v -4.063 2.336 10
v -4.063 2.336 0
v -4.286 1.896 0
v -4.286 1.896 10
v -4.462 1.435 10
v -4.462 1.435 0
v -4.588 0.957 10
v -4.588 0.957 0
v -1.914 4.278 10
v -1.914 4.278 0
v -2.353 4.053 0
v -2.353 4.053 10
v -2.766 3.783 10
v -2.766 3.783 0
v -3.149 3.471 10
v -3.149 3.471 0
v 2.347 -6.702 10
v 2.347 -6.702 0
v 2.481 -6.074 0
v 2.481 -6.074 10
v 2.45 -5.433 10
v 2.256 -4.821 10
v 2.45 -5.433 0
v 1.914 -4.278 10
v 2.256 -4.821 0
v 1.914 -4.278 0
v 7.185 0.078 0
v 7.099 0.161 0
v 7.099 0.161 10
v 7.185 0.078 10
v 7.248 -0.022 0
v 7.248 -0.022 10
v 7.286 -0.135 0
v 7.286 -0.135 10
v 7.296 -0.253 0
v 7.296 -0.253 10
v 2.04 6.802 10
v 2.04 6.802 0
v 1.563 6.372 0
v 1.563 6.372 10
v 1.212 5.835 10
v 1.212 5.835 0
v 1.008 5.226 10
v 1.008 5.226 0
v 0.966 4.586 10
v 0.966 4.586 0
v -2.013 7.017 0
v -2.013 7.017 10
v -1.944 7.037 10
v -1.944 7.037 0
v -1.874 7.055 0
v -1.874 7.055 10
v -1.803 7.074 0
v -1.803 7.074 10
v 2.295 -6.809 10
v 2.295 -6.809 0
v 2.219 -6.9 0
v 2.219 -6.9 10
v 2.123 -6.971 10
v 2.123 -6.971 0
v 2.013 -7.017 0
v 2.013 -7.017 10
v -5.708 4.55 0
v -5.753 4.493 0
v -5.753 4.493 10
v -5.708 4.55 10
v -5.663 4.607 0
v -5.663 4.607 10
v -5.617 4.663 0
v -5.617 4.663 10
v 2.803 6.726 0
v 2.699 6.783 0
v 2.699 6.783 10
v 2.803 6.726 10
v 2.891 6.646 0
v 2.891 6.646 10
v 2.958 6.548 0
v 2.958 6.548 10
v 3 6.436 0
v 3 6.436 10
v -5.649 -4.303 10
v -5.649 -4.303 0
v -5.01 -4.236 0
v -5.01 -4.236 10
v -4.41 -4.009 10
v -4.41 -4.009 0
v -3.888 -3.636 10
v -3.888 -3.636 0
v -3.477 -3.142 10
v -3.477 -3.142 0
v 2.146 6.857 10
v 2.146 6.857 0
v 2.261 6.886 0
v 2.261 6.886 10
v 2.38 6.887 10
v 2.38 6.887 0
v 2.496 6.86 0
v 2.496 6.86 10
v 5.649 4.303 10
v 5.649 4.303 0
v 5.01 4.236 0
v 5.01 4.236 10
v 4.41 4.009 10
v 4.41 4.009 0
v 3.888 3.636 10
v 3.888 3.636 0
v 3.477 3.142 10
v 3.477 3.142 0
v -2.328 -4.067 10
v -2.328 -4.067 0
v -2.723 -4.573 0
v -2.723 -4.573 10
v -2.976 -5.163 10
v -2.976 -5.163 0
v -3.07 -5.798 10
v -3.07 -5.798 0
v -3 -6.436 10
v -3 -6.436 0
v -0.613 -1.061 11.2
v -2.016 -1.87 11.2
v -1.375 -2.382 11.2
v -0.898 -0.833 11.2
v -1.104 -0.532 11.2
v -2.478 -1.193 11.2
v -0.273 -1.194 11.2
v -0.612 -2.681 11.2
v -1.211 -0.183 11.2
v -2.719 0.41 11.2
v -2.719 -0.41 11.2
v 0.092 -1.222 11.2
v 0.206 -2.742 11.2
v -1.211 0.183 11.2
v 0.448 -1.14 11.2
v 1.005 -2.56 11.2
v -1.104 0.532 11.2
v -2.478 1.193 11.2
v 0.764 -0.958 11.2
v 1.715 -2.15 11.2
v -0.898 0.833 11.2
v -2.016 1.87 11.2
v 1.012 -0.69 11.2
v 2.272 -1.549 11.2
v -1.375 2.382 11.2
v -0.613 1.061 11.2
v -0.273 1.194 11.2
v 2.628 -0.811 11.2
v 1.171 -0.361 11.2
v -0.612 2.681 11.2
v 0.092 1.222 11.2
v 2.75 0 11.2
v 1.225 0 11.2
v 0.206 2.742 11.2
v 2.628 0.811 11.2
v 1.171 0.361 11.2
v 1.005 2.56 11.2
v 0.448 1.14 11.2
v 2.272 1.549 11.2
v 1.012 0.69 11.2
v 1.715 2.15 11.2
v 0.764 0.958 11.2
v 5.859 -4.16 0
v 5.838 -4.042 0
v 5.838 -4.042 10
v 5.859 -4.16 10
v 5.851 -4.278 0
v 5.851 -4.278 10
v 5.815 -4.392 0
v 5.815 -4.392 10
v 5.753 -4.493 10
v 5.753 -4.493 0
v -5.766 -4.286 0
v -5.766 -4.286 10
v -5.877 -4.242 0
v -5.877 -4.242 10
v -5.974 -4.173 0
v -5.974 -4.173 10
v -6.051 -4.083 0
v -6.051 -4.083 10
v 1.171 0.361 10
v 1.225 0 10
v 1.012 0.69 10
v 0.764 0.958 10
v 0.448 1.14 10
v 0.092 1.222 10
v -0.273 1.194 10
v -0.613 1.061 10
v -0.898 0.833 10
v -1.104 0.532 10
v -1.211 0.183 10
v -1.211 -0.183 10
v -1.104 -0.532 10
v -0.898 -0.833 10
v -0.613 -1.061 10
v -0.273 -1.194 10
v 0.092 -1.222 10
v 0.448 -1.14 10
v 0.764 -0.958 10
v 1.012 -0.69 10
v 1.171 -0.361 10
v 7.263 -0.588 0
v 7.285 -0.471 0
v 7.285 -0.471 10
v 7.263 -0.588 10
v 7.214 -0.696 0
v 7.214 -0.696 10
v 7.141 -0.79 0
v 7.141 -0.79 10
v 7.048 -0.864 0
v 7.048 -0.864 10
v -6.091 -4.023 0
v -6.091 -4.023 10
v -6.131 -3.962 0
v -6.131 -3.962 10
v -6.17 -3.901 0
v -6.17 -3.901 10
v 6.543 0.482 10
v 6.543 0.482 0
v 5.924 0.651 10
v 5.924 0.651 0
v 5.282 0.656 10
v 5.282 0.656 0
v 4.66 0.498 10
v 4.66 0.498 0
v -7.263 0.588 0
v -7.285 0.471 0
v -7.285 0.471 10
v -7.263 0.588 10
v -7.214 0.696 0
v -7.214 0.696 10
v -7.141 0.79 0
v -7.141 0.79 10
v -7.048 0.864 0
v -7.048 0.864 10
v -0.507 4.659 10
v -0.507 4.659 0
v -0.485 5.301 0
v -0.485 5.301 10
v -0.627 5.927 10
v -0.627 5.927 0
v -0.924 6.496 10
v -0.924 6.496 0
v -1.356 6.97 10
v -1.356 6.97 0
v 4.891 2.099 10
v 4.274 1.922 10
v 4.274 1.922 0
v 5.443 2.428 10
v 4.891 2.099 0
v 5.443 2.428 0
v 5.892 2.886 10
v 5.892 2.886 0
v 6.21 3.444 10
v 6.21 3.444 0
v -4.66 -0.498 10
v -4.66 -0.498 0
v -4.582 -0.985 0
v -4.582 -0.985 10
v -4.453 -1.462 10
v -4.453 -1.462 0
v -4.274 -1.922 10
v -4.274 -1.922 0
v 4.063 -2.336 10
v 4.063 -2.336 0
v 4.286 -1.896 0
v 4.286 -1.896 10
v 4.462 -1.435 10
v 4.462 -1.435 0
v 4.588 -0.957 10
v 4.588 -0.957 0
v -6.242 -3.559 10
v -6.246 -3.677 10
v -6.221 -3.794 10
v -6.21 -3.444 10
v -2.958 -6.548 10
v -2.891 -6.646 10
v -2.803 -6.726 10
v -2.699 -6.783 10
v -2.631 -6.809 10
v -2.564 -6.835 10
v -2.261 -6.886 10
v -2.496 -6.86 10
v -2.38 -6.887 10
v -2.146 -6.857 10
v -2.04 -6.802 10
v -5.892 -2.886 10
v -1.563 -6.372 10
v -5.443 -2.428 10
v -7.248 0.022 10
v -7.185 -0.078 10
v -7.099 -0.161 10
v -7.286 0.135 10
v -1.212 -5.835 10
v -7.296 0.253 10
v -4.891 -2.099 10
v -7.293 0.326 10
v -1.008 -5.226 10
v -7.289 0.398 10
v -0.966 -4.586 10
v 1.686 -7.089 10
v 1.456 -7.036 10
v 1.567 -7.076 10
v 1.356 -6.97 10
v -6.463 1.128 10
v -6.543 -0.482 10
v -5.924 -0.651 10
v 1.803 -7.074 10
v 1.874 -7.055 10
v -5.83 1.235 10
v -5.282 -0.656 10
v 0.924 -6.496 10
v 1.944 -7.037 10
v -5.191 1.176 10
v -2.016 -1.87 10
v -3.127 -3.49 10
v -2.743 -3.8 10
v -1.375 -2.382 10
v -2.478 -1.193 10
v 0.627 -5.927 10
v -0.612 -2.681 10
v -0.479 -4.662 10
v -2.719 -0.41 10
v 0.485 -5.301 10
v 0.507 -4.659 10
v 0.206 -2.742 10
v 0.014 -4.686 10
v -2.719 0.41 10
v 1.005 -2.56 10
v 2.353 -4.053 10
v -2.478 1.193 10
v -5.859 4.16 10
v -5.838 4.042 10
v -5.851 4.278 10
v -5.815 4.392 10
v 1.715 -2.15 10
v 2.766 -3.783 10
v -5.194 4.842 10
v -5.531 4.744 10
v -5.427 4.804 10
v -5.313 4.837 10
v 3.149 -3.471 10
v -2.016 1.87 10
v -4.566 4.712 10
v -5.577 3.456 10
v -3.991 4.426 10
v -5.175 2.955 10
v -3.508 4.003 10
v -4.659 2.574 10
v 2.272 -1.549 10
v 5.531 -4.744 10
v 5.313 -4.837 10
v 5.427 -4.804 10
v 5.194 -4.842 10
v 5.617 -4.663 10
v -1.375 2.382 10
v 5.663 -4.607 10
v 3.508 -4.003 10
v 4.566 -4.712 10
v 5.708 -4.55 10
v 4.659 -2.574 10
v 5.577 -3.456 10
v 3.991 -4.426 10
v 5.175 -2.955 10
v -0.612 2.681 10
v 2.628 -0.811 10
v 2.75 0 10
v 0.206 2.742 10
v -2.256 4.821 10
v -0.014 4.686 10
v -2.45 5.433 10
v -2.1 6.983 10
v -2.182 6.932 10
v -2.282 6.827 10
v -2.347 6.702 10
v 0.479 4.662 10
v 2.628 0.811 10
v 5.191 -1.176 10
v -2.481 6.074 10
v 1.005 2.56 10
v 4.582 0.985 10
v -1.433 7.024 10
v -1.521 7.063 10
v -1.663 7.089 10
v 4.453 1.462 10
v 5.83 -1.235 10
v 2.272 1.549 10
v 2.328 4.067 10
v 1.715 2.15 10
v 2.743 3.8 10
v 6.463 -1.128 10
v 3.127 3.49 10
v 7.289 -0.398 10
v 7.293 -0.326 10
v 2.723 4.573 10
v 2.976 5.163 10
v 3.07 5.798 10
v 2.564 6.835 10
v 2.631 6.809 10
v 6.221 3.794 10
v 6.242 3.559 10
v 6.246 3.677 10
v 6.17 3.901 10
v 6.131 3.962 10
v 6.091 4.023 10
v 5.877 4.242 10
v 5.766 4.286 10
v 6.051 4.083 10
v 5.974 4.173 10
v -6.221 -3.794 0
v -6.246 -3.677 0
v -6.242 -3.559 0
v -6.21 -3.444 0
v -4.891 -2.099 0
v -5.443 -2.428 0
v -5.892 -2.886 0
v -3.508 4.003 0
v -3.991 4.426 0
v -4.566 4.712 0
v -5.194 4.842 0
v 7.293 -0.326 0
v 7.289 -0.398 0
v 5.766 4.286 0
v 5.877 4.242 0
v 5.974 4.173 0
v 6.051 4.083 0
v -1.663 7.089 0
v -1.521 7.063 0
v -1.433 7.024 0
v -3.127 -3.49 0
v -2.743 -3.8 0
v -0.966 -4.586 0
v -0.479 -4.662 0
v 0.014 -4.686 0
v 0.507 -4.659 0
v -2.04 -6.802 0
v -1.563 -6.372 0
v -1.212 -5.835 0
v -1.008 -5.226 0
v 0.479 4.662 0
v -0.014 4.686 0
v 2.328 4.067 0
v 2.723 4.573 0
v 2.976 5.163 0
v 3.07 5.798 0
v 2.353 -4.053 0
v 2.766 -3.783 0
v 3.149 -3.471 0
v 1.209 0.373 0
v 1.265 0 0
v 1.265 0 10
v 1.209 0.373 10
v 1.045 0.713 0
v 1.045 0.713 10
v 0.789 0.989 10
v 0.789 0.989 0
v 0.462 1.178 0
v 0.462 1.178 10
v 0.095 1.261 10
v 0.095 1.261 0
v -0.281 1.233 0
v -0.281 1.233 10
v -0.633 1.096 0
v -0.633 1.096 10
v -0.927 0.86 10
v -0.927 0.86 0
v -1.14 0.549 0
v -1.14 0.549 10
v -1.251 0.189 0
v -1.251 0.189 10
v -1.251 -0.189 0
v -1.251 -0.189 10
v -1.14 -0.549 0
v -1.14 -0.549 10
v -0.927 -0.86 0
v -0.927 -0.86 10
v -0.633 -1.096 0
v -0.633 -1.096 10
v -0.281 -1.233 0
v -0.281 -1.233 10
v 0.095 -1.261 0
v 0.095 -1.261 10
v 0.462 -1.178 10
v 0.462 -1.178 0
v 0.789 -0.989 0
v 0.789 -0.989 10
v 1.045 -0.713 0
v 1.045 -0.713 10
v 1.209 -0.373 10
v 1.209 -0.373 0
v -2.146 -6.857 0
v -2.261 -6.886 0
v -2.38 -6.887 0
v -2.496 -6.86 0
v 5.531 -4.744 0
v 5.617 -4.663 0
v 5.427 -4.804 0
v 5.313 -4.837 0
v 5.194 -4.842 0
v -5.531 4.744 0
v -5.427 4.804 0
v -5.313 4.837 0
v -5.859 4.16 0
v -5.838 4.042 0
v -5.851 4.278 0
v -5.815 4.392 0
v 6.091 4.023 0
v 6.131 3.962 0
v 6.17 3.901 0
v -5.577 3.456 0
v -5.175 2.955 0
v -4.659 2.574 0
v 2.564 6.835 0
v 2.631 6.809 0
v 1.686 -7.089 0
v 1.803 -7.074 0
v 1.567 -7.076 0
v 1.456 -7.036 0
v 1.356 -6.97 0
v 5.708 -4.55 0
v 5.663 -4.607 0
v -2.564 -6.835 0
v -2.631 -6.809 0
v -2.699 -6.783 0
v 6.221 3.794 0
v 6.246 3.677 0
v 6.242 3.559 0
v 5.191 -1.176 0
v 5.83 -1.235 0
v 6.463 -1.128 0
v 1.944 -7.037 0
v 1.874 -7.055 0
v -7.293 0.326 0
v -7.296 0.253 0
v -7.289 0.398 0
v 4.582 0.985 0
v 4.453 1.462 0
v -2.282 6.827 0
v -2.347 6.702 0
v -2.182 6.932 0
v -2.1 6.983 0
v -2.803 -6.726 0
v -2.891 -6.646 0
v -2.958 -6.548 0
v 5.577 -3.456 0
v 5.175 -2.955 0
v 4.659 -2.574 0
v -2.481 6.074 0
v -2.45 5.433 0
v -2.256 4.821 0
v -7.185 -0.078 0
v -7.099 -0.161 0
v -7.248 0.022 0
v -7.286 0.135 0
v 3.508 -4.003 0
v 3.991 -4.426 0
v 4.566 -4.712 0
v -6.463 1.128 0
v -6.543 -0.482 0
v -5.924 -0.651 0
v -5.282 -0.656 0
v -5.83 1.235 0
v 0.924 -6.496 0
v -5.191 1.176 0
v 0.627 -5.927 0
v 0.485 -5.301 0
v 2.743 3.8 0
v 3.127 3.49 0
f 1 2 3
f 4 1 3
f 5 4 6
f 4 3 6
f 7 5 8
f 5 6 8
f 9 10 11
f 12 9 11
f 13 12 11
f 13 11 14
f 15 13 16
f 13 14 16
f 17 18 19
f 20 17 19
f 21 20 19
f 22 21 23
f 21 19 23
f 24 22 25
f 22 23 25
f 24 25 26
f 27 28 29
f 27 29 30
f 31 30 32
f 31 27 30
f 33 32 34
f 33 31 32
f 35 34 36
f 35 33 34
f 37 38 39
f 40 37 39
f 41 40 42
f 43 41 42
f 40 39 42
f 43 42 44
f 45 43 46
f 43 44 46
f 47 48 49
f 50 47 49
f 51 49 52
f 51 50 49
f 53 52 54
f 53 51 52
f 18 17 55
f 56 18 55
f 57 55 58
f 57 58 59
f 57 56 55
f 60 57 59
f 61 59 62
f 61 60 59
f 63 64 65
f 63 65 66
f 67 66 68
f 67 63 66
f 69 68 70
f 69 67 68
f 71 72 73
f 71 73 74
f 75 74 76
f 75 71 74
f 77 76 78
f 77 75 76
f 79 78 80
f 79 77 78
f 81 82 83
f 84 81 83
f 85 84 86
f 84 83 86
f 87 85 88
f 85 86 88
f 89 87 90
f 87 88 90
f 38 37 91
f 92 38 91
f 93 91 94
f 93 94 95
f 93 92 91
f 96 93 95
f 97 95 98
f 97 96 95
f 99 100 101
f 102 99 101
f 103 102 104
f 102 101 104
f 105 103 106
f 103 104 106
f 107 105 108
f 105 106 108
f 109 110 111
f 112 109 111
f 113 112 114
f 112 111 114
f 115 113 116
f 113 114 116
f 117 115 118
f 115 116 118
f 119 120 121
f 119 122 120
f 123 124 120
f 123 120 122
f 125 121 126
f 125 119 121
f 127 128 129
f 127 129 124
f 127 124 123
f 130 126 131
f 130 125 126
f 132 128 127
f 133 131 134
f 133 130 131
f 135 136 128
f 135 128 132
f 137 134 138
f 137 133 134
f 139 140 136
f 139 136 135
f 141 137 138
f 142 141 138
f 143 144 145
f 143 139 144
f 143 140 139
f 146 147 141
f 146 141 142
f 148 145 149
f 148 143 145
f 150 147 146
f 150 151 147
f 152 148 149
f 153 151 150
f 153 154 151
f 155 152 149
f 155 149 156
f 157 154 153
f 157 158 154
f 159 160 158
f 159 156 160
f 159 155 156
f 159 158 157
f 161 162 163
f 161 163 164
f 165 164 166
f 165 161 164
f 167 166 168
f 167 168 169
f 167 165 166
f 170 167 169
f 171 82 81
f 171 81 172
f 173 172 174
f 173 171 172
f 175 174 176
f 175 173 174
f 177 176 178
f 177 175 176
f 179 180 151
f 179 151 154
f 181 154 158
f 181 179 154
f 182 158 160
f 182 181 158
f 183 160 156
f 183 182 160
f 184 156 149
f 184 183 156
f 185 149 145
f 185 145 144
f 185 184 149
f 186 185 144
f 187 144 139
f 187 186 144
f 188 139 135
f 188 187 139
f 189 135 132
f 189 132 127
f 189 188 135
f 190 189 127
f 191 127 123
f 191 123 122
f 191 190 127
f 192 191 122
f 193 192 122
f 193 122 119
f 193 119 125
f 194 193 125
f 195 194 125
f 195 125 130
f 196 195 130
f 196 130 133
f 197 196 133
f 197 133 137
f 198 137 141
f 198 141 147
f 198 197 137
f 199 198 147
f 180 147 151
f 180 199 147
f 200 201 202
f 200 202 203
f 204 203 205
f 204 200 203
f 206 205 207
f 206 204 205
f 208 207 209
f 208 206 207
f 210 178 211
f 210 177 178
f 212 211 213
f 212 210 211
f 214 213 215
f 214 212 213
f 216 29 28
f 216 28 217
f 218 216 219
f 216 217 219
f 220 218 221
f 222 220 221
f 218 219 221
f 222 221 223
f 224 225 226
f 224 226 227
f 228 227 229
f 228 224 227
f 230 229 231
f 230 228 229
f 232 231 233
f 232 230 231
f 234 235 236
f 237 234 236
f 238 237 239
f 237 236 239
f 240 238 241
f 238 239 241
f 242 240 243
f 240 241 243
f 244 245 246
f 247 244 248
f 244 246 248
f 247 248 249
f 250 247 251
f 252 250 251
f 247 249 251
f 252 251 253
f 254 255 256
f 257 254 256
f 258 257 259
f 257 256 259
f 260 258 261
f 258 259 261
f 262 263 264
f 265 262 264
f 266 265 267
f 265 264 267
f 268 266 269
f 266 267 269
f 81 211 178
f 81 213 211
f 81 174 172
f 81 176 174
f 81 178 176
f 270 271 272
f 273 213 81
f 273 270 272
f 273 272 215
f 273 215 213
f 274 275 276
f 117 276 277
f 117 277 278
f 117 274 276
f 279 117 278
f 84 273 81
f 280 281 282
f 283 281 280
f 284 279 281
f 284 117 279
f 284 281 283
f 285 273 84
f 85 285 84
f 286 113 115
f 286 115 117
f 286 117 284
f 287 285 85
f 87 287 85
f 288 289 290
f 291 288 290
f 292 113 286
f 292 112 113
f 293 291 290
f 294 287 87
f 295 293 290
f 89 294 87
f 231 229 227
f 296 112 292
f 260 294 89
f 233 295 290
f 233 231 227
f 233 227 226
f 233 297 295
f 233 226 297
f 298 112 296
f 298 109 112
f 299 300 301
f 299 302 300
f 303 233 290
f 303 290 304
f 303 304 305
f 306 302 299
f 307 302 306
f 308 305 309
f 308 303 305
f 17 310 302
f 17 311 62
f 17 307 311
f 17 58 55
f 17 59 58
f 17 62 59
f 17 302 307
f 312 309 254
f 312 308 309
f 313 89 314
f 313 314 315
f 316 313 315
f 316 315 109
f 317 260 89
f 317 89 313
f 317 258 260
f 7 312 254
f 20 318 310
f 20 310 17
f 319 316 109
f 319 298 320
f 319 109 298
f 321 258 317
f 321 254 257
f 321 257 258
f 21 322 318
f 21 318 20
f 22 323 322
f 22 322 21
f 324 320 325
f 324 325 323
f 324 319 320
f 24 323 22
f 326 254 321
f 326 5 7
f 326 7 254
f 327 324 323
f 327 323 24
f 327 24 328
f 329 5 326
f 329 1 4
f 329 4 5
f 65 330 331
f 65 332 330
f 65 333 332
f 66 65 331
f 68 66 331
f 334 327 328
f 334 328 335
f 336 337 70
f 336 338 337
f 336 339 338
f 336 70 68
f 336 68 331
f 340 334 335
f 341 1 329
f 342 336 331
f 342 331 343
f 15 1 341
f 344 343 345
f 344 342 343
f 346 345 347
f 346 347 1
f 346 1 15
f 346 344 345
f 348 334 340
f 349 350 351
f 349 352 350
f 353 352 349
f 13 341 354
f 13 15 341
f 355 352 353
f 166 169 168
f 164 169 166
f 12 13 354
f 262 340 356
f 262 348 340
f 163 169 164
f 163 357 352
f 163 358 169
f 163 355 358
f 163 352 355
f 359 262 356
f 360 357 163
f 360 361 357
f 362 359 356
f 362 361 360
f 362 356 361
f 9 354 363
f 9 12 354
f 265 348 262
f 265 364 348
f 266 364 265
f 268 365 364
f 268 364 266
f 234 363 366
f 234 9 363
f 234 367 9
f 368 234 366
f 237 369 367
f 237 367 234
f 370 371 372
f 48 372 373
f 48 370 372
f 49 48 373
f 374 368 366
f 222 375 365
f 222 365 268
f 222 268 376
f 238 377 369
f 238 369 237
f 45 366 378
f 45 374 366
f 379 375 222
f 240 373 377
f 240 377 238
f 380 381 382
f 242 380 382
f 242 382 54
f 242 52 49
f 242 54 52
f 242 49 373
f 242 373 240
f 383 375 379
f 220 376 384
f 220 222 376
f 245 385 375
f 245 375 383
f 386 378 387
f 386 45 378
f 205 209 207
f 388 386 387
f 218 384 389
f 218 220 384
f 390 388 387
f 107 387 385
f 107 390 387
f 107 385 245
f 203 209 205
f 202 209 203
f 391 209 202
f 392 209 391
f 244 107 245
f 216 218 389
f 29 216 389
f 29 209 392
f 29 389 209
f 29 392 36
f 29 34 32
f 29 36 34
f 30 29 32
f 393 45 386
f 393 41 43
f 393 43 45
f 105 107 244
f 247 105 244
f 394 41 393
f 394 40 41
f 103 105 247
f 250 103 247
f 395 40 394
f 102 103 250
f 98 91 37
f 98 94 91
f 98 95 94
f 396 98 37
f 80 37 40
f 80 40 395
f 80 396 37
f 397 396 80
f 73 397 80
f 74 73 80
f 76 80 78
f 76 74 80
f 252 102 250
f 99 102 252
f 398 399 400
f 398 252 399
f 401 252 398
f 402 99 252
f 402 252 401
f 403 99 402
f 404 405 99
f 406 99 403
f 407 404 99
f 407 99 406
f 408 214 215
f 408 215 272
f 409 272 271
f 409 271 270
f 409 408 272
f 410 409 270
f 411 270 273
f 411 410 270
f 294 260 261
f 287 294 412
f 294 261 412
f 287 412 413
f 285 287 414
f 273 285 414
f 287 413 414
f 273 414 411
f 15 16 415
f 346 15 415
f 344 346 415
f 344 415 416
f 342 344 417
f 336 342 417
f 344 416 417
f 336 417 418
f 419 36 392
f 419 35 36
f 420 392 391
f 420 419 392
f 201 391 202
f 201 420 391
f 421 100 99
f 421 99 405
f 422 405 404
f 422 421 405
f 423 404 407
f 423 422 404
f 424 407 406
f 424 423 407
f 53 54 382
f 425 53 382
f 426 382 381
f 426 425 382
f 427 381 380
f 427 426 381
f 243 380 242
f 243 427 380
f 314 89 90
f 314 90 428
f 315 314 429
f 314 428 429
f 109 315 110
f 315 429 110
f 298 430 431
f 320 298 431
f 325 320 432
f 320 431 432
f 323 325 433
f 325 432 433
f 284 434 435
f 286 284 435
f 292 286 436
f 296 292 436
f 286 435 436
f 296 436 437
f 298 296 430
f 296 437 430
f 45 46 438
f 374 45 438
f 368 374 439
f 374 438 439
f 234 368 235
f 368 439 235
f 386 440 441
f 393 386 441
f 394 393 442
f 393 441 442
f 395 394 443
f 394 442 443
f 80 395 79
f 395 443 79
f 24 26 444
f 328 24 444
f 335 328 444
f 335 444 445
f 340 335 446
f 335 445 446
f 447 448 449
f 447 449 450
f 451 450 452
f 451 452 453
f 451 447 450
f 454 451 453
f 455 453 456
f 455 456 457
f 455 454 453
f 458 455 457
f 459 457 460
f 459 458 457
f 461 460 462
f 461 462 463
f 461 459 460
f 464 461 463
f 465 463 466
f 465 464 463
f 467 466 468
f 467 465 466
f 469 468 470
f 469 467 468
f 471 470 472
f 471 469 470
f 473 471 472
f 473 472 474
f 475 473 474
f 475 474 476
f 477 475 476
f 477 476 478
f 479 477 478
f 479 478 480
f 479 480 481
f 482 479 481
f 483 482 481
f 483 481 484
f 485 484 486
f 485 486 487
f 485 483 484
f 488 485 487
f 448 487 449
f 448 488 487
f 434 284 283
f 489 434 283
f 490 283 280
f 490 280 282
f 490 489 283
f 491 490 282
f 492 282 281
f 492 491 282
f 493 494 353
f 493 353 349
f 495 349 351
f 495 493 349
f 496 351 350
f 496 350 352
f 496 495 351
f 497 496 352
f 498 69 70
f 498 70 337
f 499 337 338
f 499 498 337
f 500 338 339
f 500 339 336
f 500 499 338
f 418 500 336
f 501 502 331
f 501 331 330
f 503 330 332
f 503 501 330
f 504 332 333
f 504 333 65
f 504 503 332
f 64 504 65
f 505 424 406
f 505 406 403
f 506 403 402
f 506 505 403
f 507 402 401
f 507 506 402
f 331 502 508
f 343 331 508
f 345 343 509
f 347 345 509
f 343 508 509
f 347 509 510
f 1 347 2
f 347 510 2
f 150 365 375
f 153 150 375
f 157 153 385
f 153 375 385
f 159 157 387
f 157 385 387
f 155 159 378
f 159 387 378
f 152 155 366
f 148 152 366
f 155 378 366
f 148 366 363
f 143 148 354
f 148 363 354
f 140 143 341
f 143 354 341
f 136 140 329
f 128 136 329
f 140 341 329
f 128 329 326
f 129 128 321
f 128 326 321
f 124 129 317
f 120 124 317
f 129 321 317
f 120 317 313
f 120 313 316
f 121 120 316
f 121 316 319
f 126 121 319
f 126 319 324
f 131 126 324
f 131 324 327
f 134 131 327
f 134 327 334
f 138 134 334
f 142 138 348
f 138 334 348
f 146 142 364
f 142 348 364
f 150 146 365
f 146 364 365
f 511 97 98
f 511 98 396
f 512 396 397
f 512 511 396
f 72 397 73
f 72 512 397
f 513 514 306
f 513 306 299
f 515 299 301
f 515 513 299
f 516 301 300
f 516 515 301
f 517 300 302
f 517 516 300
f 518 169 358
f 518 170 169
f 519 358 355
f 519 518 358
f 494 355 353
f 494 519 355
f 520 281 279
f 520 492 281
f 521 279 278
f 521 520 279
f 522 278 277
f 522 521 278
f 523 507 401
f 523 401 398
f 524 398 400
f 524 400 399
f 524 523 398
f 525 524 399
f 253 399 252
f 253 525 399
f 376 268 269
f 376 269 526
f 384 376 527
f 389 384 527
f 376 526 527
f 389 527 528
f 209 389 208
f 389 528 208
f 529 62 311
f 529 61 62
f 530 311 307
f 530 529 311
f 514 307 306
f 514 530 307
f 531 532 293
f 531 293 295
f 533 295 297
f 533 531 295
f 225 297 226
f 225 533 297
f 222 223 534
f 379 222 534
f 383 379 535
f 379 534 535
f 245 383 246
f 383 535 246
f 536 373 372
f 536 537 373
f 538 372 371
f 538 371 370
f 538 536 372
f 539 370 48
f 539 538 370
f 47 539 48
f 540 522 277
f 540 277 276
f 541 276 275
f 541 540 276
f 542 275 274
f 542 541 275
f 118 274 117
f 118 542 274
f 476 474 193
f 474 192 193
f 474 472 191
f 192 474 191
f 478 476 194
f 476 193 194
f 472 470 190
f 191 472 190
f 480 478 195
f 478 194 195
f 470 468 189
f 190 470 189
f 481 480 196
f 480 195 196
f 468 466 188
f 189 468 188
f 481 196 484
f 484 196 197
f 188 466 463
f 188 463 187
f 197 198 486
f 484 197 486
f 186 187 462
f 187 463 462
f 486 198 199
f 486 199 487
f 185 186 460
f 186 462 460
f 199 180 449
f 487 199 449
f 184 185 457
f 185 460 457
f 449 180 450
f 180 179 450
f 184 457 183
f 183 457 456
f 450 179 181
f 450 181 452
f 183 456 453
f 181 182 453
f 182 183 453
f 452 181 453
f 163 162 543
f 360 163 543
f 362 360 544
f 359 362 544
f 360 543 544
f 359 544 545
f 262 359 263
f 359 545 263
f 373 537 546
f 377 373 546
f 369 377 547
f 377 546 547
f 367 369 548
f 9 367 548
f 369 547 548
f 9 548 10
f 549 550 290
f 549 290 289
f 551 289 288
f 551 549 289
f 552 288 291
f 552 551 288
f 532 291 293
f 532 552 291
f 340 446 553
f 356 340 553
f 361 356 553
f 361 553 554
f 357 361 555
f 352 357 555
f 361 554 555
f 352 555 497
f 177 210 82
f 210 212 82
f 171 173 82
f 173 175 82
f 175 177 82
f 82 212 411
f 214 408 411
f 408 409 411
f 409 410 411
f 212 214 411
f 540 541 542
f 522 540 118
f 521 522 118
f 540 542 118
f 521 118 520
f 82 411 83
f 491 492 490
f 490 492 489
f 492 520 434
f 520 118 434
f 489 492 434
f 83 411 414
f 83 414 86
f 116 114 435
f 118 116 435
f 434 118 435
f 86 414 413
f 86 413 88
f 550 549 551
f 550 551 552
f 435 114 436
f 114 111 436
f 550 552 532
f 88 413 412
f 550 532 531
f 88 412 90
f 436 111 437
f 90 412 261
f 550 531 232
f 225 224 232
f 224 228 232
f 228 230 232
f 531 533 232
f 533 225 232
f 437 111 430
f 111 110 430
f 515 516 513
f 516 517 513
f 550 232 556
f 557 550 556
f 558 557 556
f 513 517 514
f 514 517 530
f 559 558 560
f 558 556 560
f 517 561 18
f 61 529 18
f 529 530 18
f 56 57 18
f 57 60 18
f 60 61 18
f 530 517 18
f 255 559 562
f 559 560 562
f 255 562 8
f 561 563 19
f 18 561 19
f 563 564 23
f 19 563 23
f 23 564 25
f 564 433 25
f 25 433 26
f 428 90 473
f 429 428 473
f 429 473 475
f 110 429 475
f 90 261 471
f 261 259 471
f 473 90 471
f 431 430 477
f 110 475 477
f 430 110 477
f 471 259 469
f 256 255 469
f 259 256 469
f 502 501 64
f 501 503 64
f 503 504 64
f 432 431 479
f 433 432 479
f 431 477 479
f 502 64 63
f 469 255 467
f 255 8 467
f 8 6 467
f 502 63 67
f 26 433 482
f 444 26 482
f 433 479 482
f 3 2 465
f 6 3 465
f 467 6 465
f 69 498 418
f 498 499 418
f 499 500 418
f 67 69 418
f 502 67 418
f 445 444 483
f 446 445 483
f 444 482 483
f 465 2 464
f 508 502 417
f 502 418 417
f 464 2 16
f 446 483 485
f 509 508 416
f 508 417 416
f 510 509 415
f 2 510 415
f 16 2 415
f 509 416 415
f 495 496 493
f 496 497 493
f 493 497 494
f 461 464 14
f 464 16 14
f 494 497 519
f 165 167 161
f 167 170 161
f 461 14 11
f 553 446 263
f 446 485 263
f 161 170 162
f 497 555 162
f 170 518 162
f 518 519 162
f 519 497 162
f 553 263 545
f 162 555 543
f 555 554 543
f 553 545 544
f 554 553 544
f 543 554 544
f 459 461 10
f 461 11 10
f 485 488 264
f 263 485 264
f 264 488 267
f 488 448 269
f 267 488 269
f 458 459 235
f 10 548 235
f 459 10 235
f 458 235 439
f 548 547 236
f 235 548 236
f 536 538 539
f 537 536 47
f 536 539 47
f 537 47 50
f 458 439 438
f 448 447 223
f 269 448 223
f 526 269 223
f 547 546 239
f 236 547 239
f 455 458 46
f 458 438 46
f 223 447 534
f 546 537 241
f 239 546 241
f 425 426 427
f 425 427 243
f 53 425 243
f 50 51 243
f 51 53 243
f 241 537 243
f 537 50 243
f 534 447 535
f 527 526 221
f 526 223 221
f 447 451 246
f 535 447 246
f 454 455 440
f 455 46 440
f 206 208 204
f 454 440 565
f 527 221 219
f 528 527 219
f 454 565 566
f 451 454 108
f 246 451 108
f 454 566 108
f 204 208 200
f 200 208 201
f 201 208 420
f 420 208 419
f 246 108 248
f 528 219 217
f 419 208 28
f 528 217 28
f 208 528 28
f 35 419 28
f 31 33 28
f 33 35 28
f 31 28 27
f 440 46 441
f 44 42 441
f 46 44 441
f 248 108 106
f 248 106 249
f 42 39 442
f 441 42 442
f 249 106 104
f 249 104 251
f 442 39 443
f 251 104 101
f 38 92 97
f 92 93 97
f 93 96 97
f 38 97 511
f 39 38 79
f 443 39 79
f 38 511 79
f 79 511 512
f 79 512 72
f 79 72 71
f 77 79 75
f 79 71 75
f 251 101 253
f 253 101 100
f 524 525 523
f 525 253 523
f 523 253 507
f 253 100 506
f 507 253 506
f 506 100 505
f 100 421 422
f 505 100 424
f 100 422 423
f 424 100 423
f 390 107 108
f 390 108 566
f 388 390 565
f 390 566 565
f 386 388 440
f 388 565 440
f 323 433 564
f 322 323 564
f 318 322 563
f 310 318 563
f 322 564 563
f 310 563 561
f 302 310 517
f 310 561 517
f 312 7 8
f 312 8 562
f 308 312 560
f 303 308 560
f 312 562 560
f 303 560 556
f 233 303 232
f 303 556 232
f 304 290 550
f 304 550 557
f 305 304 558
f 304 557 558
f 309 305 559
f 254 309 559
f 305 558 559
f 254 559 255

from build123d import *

# Parameters (mm, degrees)
SKETCH_1_R               = 1.265
EXTRUDE_1_DEPTH          = 10
SKETCH_2_R               = 2.75
SKETCH_2_R_2             = 1.225
EXTRUDE_2_DEPTH          = 1.2
SKETCH_3_R               = 10.210079725
SKETCH_3_R_2             = 7.3
CUT_EXTRUDE_2_DEPTH      = 16.316956182
FILLET_1_R               = 0.5
PATTERN_CIRCULAR_2_DEPTH = 10


# Read off the part's stored shape, not the designer's step: Круговой массив2
with BuildPart() as part:
    # Эскиз1 → Бобышка-Вытянуть1 (new body)
    with BuildSketch(Plane.XY):
        with BuildLine():
            ThreePointArc((-3.148803906, 3.471068454), (-4.227852242, 4.566214035), (-5.743712894, 4.822837566))
            ThreePointArc((-5.743712894, 4.822837566), (-5.841480421, 4.703945843), (-5.936787387, 4.583072716))
            ThreePointArc((-5.936787387, 4.583072716), (-5.362797198, 3.156810321), (-4.062728379, 2.336133637))
            ThreePointArc((-4.062728379, 2.336133637), (-4.379801209, 1.667520202), (-4.587678719, 0.95733287))
            ThreePointArc((-4.587678719, 0.95733287), (-6.104357582, 1.209075557), (-7.481554138, 0.525687819))
            ThreePointArc((-7.481554138, 0.525687819), (-7.490766927, 0.372036085), (-7.496824441, 0.218227641))
            ThreePointArc((-7.496824441, 0.218227641), (-6.194120622, -0.598259906), (-4.659961201, -0.498040012))
            ThreePointArc((-4.659961201, -0.498040012), (-4.523477392, -1.225330377), (-4.274216191, -1.922071332))
            ThreePointArc((-4.274216191, -1.922071332), (-5.649205805, -2.609888688), (-6.361695989, -3.972256807))
            ThreePointArc((-6.361695989, -3.972256807), (-6.278835069, -4.101978813), (-6.193329365, -4.229972975))
            ThreePointArc((-6.193329365, -4.229972975), (-4.659500498, -4.124815183), (-3.477247231, -3.141979304))
            ThreePointArc((-3.477247231, -3.141979304), (-2.939338959, -3.650146399), (-2.328148353, -4.067309614))
            ThreePointArc((-2.328148353, -4.067309614), (-3.03624942, -5.431964161), (-2.811886199, -6.952934345))
            ThreePointArc((-2.811886199, -6.952934345), (-2.668601624, -7.009177225), (-2.524192976, -7.062467686))
            ThreePointArc((-2.524192976, -7.062467686), (-1.345109555, -6.075831258), (-0.966343005, -4.585789294))
            ThreePointArc((-0.966343005, -4.585789294), (-0.232472948, -4.68073056), (0.507193024, -4.658973866))
            ThreePointArc((0.507193024, -4.658973866), (0.736451045, -6.179213951), (1.811968547, -7.277827285))
            ThreePointArc((1.811968547, -7.277827285), (1.960946938, -7.239108171), (2.109099336, -7.197339786))
            ThreePointArc((2.109099336, -7.197339786), (2.483067519, -5.706086302), (1.913671403, -4.277983638))
            ThreePointArc((1.913671403, -4.277983638), (2.563189827, -3.92343474), (3.148803906, -3.471068454))
            ThreePointArc((3.148803906, -3.471068454), (4.227852242, -4.566214035), (5.743712894, -4.822837566))
            ThreePointArc((5.743712894, -4.822837566), (5.841480421, -4.703945843), (5.936787387, -4.583072716))
            ThreePointArc((5.936787387, -4.583072716), (5.362797198, -3.156810321), (4.062728379, -2.336133637))
            ThreePointArc((4.062728379, -2.336133637), (4.379801209, -1.667520202), (4.587678719, -0.95733287))
            ThreePointArc((4.587678719, -0.95733287), (6.104357582, -1.209075557), (7.481554138, -0.525687819))
            ThreePointArc((7.481554138, -0.525687819), (7.490766927, -0.372036085), (7.496824441, -0.218227641))
            ThreePointArc((7.496824441, -0.218227641), (6.194120622, 0.598259906), (4.659961201, 0.498040012))
            ThreePointArc((4.659961201, 0.498040012), (4.523477392, 1.225330377), (4.274216191, 1.922071332))
            ThreePointArc((4.274216191, 1.922071332), (5.649205805, 2.609888688), (6.361695989, 3.972256807))
            ThreePointArc((6.361695989, 3.972256807), (6.278835069, 4.101978813), (6.193329365, 4.229972975))
            ThreePointArc((6.193329365, 4.229972975), (4.659500498, 4.124815183), (3.477247231, 3.141979304))
            ThreePointArc((3.477247231, 3.141979304), (2.939338959, 3.650146399), (2.328148353, 4.067309614))
            ThreePointArc((2.328148353, 4.067309614), (3.03624942, 5.431964161), (2.811886199, 6.952934345))
            ThreePointArc((2.811886199, 6.952934345), (2.668601624, 7.009177225), (2.524192976, 7.062467686))
            ThreePointArc((2.524192976, 7.062467686), (1.345109555, 6.075831258), (0.966343005, 4.585789294))
            ThreePointArc((0.966343005, 4.585789294), (0.232472948, 4.68073056), (-0.507193024, 4.658973866))
            ThreePointArc((-0.507193024, 4.658973866), (-0.736451045, 6.179213951), (-1.811968547, 7.277827285))
            ThreePointArc((-1.811968547, 7.277827285), (-1.960946938, 7.239108171), (-2.109099336, 7.197339786))
            ThreePointArc((-2.109099336, 7.197339786), (-2.483067519, 5.706086302), (-1.913671403, 4.277983638))
            ThreePointArc((-1.913671403, 4.277983638), (-2.563189827, 3.92343474), (-3.148803906, 3.471068454))
        make_face()
        Circle(SKETCH_1_R, mode=Mode.SUBTRACT)
    extrude(amount=EXTRUDE_1_DEPTH)

    # Эскиз2 → Бобышка-Вытянуть2 (add)
    with BuildSketch(Plane.XY.offset(10)):
        Circle(SKETCH_2_R)
        Circle(SKETCH_2_R_2, mode=Mode.SUBTRACT)
    extrude(amount=EXTRUDE_2_DEPTH)

    # Эскиз3 → Вырез-Вытянуть2 (cut, through all)
    with BuildSketch(Plane(origin=(0, 0, 0), x_dir=(-1, 0, 0), z_dir=(0, 0, -1))):
        Circle(SKETCH_3_R)
        Circle(SKETCH_3_R_2, mode=Mode.SUBTRACT)
    extrude(amount=-CUT_EXTRUDE_2_DEPTH, mode=Mode.SUBTRACT)

    # Скругление1
    fillet_1_edges = [part.edges().sort_by_distance(p)[0] for p in [
        (-2.246892365, 6.945608303, 5),
        (-1.565958675, 7.13006125, 5),
    ]]
    fillet(fillet_1_edges, radius=FILLET_1_R)

    # Круговой массив2 outline → Круговой массив2 (cut)
    with BuildSketch(Plane.XY):
        with BuildLine():
            ThreePointArc((-5.838293306, 4.042408612), (-5.850561559, 4.278183981), (-5.753278974, 4.493304024))
            ThreePointArc((-5.753278974, 4.493304024), (-5.827604273, 4.396479095), (-5.900300237, 4.298424958))
            ThreePointArc((-5.900300237, 4.298424958), (-5.872671085, 4.169599529), (-5.838293306, 4.042408612))
        make_face()
        with BuildLine():
            ThreePointArc((-5.457832031, 4.847893307), (-5.538127486, 4.755958783), (-5.61687454, 4.662694543))
            ThreePointArc((-5.61687454, 4.662694543), (-5.427449488, 4.803615386), (-5.19448163, 4.841910441))
            ThreePointArc((-5.19448163, 4.841910441), (-5.326077976, 4.84837285), (-5.457832031, 4.847893307))
        make_face()
        with BuildLine():
            ThreePointArc((-7.099346669, -0.161285439), (-7.247857179, 0.022249743), (-7.295598302, 0.253466783))
            ThreePointArc((-7.295598302, 0.253466783), (-7.298816468, 0.131446456), (-7.299993962, 0.009389377))
            ThreePointArc((-7.299993962, 0.009389377), (-7.201919821, -0.078592576), (-7.099346669, -0.161285439))
        make_face()
        with BuildLine():
            ThreePointArc((-7.264999056, 0.713994895), (-7.275921686, 0.592421818), (-7.284810046, 0.470683106))
            ThreePointArc((-7.284810046, 0.470683106), (-7.214393154, 0.696031715), (-7.048427465, 0.863948137))
            ThreePointArc((-7.048427465, 0.863948137), (-7.158689654, 0.791825944), (-7.264999056, 0.713994895))
        make_face()
        with BuildLine():
            ThreePointArc((-5.648690902, -4.303373934), (-5.876717701, -4.24218314), (-6.051247048, -4.083186154))
            ThreePointArc((-6.051247048, -4.083186154), (-5.982128849, -4.183794263), (-5.911338111, -4.283232627))
            ThreePointArc((-5.911338111, -4.283232627), (-5.78027997, -4.296764989), (-5.648690902, -4.303373934))
        make_face()
        with BuildLine():
            ThreePointArc((-6.29718337, -3.692625299), (-6.234561102, -3.797400146), (-6.170195716, -3.90111328))
            ThreePointArc((-6.170195716, -3.90111328), (-6.245683843, -3.677412414), (-6.210113576, -3.444012991))
            ThreePointArc((-6.210113576, -3.444012991), (-6.2569252, -3.567171559), (-6.29718337, -3.692625299))
        make_face()
        with BuildLine():
            ThreePointArc((-2.040427202, -6.801719852), (-2.260871804, -6.88624625), (-2.495525095, -6.860200762))
            ThreePointArc((-2.495525095, -6.860200762), (-2.380471335, -6.900967774), (-2.264752021, -6.939805349))
            ThreePointArc((-2.264752021, -6.939805349), (-2.150769635, -6.873719217), (-2.040427202, -6.801719852))
        make_face()
        with BuildLine():
            ThreePointArc((-2.92405767, -6.688788137), (-2.811810081, -6.736744322), (-2.69877634, -6.782816986))
            ThreePointArc((-2.69877634, -6.782816986), (-2.891335587, -6.646209992), (-2.999747375, -6.436478214))
            ThreePointArc((-2.999747375, -6.436478214), (-2.965227985, -6.563630771), (-2.92405767, -6.688788137))
        make_face()
        with BuildLine():
            ThreePointArc((2.347210337, -6.702039969), (2.218550278, -6.899997348), (2.013402624, -7.016851849))
            ThreePointArc((2.013402624, -7.016851849), (2.130445319, -6.982206151), (2.246892365, -6.945608303))
            ThreePointArc((2.246892365, -6.945608303), (2.300261598, -6.825146334), (2.347210337, -6.702039969))
        make_face()
        with BuildLine():
            ThreePointArc((1.565958675, -7.13006125), (1.684956821, -7.102881142), (1.80348387, -7.073715143))
            ThreePointArc((1.80348387, -7.073715143), (1.56740459, -7.076381249), (1.356420365, -6.970427527))
            ThreePointArc((1.356420365, -6.970427527), (1.459085537, -7.053006118), (1.565958675, -7.13006125))
        make_face()
        with BuildLine():
            ThreePointArc((5.838293306, -4.042408612), (5.850561559, -4.278183981), (5.753278974, -4.493304024))
            ThreePointArc((5.753278974, -4.493304024), (5.827604273, -4.396479095), (5.900300237, -4.298424958))
            ThreePointArc((5.900300237, -4.298424958), (5.872671085, -4.169599529), (5.838293306, -4.042408612))
        make_face()
        with BuildLine():
            ThreePointArc((5.457832031, -4.847893307), (5.538127486, -4.755958783), (5.61687454, -4.662694543))
            ThreePointArc((5.61687454, -4.662694543), (5.427449488, -4.803615386), (5.19448163, -4.841910441))
            ThreePointArc((5.19448163, -4.841910441), (5.326077976, -4.84837285), (5.457832031, -4.847893307))
        make_face()
        with BuildLine():
            ThreePointArc((7.099346669, 0.161285439), (7.247857179, -0.022249743), (7.295598302, -0.253466783))
            ThreePointArc((7.295598302, -0.253466783), (7.298816468, -0.131446456), (7.299993962, -0.009389377))
            ThreePointArc((7.299993962, -0.009389377), (7.201919821, 0.078592576), (7.099346669, 0.161285439))
        make_face()
        with BuildLine():
            ThreePointArc((7.264999056, -0.713994895), (7.275921686, -0.592421818), (7.284810046, -0.470683106))
            ThreePointArc((7.284810046, -0.470683106), (7.214393154, -0.696031715), (7.048427465, -0.863948137))
            ThreePointArc((7.048427465, -0.863948137), (7.158689654, -0.791825944), (7.264999056, -0.713994895))
        make_face()
        with BuildLine():
            ThreePointArc((5.648690902, 4.303373934), (5.876717701, 4.24218314), (6.051247048, 4.083186154))
            ThreePointArc((6.051247048, 4.083186154), (5.982128849, 4.183794263), (5.911338111, 4.283232627))
            ThreePointArc((5.911338111, 4.283232627), (5.78027997, 4.296764989), (5.648690902, 4.303373934))
        make_face()
        with BuildLine():
            ThreePointArc((6.29718337, 3.692625299), (6.234561102, 3.797400146), (6.170195716, 3.90111328))
            ThreePointArc((6.170195716, 3.90111328), (6.245683843, 3.677412414), (6.210113576, 3.444012991))
            ThreePointArc((6.210113576, 3.444012991), (6.2569252, 3.567171559), (6.29718337, 3.692625299))
        make_face()
        with BuildLine():
            ThreePointArc((2.040427202, 6.801719852), (2.260871804, 6.88624625), (2.495525095, 6.860200762))
            ThreePointArc((2.495525095, 6.860200762), (2.380471335, 6.900967774), (2.264752021, 6.939805349))
            ThreePointArc((2.264752021, 6.939805349), (2.150769635, 6.873719217), (2.040427202, 6.801719852))
        make_face()
        with BuildLine():
            ThreePointArc((2.92405767, 6.688788137), (2.811810081, 6.736744322), (2.69877634, 6.782816986))
            ThreePointArc((2.69877634, 6.782816986), (2.891335587, 6.646209992), (2.999747375, 6.436478214))
            ThreePointArc((2.999747375, 6.436478214), (2.965227985, 6.563630771), (2.92405767, 6.688788137))
        make_face()
    extrude(amount=PATTERN_CIRCULAR_2_DEPTH, mode=Mode.SUBTRACT)


solid = part.part
